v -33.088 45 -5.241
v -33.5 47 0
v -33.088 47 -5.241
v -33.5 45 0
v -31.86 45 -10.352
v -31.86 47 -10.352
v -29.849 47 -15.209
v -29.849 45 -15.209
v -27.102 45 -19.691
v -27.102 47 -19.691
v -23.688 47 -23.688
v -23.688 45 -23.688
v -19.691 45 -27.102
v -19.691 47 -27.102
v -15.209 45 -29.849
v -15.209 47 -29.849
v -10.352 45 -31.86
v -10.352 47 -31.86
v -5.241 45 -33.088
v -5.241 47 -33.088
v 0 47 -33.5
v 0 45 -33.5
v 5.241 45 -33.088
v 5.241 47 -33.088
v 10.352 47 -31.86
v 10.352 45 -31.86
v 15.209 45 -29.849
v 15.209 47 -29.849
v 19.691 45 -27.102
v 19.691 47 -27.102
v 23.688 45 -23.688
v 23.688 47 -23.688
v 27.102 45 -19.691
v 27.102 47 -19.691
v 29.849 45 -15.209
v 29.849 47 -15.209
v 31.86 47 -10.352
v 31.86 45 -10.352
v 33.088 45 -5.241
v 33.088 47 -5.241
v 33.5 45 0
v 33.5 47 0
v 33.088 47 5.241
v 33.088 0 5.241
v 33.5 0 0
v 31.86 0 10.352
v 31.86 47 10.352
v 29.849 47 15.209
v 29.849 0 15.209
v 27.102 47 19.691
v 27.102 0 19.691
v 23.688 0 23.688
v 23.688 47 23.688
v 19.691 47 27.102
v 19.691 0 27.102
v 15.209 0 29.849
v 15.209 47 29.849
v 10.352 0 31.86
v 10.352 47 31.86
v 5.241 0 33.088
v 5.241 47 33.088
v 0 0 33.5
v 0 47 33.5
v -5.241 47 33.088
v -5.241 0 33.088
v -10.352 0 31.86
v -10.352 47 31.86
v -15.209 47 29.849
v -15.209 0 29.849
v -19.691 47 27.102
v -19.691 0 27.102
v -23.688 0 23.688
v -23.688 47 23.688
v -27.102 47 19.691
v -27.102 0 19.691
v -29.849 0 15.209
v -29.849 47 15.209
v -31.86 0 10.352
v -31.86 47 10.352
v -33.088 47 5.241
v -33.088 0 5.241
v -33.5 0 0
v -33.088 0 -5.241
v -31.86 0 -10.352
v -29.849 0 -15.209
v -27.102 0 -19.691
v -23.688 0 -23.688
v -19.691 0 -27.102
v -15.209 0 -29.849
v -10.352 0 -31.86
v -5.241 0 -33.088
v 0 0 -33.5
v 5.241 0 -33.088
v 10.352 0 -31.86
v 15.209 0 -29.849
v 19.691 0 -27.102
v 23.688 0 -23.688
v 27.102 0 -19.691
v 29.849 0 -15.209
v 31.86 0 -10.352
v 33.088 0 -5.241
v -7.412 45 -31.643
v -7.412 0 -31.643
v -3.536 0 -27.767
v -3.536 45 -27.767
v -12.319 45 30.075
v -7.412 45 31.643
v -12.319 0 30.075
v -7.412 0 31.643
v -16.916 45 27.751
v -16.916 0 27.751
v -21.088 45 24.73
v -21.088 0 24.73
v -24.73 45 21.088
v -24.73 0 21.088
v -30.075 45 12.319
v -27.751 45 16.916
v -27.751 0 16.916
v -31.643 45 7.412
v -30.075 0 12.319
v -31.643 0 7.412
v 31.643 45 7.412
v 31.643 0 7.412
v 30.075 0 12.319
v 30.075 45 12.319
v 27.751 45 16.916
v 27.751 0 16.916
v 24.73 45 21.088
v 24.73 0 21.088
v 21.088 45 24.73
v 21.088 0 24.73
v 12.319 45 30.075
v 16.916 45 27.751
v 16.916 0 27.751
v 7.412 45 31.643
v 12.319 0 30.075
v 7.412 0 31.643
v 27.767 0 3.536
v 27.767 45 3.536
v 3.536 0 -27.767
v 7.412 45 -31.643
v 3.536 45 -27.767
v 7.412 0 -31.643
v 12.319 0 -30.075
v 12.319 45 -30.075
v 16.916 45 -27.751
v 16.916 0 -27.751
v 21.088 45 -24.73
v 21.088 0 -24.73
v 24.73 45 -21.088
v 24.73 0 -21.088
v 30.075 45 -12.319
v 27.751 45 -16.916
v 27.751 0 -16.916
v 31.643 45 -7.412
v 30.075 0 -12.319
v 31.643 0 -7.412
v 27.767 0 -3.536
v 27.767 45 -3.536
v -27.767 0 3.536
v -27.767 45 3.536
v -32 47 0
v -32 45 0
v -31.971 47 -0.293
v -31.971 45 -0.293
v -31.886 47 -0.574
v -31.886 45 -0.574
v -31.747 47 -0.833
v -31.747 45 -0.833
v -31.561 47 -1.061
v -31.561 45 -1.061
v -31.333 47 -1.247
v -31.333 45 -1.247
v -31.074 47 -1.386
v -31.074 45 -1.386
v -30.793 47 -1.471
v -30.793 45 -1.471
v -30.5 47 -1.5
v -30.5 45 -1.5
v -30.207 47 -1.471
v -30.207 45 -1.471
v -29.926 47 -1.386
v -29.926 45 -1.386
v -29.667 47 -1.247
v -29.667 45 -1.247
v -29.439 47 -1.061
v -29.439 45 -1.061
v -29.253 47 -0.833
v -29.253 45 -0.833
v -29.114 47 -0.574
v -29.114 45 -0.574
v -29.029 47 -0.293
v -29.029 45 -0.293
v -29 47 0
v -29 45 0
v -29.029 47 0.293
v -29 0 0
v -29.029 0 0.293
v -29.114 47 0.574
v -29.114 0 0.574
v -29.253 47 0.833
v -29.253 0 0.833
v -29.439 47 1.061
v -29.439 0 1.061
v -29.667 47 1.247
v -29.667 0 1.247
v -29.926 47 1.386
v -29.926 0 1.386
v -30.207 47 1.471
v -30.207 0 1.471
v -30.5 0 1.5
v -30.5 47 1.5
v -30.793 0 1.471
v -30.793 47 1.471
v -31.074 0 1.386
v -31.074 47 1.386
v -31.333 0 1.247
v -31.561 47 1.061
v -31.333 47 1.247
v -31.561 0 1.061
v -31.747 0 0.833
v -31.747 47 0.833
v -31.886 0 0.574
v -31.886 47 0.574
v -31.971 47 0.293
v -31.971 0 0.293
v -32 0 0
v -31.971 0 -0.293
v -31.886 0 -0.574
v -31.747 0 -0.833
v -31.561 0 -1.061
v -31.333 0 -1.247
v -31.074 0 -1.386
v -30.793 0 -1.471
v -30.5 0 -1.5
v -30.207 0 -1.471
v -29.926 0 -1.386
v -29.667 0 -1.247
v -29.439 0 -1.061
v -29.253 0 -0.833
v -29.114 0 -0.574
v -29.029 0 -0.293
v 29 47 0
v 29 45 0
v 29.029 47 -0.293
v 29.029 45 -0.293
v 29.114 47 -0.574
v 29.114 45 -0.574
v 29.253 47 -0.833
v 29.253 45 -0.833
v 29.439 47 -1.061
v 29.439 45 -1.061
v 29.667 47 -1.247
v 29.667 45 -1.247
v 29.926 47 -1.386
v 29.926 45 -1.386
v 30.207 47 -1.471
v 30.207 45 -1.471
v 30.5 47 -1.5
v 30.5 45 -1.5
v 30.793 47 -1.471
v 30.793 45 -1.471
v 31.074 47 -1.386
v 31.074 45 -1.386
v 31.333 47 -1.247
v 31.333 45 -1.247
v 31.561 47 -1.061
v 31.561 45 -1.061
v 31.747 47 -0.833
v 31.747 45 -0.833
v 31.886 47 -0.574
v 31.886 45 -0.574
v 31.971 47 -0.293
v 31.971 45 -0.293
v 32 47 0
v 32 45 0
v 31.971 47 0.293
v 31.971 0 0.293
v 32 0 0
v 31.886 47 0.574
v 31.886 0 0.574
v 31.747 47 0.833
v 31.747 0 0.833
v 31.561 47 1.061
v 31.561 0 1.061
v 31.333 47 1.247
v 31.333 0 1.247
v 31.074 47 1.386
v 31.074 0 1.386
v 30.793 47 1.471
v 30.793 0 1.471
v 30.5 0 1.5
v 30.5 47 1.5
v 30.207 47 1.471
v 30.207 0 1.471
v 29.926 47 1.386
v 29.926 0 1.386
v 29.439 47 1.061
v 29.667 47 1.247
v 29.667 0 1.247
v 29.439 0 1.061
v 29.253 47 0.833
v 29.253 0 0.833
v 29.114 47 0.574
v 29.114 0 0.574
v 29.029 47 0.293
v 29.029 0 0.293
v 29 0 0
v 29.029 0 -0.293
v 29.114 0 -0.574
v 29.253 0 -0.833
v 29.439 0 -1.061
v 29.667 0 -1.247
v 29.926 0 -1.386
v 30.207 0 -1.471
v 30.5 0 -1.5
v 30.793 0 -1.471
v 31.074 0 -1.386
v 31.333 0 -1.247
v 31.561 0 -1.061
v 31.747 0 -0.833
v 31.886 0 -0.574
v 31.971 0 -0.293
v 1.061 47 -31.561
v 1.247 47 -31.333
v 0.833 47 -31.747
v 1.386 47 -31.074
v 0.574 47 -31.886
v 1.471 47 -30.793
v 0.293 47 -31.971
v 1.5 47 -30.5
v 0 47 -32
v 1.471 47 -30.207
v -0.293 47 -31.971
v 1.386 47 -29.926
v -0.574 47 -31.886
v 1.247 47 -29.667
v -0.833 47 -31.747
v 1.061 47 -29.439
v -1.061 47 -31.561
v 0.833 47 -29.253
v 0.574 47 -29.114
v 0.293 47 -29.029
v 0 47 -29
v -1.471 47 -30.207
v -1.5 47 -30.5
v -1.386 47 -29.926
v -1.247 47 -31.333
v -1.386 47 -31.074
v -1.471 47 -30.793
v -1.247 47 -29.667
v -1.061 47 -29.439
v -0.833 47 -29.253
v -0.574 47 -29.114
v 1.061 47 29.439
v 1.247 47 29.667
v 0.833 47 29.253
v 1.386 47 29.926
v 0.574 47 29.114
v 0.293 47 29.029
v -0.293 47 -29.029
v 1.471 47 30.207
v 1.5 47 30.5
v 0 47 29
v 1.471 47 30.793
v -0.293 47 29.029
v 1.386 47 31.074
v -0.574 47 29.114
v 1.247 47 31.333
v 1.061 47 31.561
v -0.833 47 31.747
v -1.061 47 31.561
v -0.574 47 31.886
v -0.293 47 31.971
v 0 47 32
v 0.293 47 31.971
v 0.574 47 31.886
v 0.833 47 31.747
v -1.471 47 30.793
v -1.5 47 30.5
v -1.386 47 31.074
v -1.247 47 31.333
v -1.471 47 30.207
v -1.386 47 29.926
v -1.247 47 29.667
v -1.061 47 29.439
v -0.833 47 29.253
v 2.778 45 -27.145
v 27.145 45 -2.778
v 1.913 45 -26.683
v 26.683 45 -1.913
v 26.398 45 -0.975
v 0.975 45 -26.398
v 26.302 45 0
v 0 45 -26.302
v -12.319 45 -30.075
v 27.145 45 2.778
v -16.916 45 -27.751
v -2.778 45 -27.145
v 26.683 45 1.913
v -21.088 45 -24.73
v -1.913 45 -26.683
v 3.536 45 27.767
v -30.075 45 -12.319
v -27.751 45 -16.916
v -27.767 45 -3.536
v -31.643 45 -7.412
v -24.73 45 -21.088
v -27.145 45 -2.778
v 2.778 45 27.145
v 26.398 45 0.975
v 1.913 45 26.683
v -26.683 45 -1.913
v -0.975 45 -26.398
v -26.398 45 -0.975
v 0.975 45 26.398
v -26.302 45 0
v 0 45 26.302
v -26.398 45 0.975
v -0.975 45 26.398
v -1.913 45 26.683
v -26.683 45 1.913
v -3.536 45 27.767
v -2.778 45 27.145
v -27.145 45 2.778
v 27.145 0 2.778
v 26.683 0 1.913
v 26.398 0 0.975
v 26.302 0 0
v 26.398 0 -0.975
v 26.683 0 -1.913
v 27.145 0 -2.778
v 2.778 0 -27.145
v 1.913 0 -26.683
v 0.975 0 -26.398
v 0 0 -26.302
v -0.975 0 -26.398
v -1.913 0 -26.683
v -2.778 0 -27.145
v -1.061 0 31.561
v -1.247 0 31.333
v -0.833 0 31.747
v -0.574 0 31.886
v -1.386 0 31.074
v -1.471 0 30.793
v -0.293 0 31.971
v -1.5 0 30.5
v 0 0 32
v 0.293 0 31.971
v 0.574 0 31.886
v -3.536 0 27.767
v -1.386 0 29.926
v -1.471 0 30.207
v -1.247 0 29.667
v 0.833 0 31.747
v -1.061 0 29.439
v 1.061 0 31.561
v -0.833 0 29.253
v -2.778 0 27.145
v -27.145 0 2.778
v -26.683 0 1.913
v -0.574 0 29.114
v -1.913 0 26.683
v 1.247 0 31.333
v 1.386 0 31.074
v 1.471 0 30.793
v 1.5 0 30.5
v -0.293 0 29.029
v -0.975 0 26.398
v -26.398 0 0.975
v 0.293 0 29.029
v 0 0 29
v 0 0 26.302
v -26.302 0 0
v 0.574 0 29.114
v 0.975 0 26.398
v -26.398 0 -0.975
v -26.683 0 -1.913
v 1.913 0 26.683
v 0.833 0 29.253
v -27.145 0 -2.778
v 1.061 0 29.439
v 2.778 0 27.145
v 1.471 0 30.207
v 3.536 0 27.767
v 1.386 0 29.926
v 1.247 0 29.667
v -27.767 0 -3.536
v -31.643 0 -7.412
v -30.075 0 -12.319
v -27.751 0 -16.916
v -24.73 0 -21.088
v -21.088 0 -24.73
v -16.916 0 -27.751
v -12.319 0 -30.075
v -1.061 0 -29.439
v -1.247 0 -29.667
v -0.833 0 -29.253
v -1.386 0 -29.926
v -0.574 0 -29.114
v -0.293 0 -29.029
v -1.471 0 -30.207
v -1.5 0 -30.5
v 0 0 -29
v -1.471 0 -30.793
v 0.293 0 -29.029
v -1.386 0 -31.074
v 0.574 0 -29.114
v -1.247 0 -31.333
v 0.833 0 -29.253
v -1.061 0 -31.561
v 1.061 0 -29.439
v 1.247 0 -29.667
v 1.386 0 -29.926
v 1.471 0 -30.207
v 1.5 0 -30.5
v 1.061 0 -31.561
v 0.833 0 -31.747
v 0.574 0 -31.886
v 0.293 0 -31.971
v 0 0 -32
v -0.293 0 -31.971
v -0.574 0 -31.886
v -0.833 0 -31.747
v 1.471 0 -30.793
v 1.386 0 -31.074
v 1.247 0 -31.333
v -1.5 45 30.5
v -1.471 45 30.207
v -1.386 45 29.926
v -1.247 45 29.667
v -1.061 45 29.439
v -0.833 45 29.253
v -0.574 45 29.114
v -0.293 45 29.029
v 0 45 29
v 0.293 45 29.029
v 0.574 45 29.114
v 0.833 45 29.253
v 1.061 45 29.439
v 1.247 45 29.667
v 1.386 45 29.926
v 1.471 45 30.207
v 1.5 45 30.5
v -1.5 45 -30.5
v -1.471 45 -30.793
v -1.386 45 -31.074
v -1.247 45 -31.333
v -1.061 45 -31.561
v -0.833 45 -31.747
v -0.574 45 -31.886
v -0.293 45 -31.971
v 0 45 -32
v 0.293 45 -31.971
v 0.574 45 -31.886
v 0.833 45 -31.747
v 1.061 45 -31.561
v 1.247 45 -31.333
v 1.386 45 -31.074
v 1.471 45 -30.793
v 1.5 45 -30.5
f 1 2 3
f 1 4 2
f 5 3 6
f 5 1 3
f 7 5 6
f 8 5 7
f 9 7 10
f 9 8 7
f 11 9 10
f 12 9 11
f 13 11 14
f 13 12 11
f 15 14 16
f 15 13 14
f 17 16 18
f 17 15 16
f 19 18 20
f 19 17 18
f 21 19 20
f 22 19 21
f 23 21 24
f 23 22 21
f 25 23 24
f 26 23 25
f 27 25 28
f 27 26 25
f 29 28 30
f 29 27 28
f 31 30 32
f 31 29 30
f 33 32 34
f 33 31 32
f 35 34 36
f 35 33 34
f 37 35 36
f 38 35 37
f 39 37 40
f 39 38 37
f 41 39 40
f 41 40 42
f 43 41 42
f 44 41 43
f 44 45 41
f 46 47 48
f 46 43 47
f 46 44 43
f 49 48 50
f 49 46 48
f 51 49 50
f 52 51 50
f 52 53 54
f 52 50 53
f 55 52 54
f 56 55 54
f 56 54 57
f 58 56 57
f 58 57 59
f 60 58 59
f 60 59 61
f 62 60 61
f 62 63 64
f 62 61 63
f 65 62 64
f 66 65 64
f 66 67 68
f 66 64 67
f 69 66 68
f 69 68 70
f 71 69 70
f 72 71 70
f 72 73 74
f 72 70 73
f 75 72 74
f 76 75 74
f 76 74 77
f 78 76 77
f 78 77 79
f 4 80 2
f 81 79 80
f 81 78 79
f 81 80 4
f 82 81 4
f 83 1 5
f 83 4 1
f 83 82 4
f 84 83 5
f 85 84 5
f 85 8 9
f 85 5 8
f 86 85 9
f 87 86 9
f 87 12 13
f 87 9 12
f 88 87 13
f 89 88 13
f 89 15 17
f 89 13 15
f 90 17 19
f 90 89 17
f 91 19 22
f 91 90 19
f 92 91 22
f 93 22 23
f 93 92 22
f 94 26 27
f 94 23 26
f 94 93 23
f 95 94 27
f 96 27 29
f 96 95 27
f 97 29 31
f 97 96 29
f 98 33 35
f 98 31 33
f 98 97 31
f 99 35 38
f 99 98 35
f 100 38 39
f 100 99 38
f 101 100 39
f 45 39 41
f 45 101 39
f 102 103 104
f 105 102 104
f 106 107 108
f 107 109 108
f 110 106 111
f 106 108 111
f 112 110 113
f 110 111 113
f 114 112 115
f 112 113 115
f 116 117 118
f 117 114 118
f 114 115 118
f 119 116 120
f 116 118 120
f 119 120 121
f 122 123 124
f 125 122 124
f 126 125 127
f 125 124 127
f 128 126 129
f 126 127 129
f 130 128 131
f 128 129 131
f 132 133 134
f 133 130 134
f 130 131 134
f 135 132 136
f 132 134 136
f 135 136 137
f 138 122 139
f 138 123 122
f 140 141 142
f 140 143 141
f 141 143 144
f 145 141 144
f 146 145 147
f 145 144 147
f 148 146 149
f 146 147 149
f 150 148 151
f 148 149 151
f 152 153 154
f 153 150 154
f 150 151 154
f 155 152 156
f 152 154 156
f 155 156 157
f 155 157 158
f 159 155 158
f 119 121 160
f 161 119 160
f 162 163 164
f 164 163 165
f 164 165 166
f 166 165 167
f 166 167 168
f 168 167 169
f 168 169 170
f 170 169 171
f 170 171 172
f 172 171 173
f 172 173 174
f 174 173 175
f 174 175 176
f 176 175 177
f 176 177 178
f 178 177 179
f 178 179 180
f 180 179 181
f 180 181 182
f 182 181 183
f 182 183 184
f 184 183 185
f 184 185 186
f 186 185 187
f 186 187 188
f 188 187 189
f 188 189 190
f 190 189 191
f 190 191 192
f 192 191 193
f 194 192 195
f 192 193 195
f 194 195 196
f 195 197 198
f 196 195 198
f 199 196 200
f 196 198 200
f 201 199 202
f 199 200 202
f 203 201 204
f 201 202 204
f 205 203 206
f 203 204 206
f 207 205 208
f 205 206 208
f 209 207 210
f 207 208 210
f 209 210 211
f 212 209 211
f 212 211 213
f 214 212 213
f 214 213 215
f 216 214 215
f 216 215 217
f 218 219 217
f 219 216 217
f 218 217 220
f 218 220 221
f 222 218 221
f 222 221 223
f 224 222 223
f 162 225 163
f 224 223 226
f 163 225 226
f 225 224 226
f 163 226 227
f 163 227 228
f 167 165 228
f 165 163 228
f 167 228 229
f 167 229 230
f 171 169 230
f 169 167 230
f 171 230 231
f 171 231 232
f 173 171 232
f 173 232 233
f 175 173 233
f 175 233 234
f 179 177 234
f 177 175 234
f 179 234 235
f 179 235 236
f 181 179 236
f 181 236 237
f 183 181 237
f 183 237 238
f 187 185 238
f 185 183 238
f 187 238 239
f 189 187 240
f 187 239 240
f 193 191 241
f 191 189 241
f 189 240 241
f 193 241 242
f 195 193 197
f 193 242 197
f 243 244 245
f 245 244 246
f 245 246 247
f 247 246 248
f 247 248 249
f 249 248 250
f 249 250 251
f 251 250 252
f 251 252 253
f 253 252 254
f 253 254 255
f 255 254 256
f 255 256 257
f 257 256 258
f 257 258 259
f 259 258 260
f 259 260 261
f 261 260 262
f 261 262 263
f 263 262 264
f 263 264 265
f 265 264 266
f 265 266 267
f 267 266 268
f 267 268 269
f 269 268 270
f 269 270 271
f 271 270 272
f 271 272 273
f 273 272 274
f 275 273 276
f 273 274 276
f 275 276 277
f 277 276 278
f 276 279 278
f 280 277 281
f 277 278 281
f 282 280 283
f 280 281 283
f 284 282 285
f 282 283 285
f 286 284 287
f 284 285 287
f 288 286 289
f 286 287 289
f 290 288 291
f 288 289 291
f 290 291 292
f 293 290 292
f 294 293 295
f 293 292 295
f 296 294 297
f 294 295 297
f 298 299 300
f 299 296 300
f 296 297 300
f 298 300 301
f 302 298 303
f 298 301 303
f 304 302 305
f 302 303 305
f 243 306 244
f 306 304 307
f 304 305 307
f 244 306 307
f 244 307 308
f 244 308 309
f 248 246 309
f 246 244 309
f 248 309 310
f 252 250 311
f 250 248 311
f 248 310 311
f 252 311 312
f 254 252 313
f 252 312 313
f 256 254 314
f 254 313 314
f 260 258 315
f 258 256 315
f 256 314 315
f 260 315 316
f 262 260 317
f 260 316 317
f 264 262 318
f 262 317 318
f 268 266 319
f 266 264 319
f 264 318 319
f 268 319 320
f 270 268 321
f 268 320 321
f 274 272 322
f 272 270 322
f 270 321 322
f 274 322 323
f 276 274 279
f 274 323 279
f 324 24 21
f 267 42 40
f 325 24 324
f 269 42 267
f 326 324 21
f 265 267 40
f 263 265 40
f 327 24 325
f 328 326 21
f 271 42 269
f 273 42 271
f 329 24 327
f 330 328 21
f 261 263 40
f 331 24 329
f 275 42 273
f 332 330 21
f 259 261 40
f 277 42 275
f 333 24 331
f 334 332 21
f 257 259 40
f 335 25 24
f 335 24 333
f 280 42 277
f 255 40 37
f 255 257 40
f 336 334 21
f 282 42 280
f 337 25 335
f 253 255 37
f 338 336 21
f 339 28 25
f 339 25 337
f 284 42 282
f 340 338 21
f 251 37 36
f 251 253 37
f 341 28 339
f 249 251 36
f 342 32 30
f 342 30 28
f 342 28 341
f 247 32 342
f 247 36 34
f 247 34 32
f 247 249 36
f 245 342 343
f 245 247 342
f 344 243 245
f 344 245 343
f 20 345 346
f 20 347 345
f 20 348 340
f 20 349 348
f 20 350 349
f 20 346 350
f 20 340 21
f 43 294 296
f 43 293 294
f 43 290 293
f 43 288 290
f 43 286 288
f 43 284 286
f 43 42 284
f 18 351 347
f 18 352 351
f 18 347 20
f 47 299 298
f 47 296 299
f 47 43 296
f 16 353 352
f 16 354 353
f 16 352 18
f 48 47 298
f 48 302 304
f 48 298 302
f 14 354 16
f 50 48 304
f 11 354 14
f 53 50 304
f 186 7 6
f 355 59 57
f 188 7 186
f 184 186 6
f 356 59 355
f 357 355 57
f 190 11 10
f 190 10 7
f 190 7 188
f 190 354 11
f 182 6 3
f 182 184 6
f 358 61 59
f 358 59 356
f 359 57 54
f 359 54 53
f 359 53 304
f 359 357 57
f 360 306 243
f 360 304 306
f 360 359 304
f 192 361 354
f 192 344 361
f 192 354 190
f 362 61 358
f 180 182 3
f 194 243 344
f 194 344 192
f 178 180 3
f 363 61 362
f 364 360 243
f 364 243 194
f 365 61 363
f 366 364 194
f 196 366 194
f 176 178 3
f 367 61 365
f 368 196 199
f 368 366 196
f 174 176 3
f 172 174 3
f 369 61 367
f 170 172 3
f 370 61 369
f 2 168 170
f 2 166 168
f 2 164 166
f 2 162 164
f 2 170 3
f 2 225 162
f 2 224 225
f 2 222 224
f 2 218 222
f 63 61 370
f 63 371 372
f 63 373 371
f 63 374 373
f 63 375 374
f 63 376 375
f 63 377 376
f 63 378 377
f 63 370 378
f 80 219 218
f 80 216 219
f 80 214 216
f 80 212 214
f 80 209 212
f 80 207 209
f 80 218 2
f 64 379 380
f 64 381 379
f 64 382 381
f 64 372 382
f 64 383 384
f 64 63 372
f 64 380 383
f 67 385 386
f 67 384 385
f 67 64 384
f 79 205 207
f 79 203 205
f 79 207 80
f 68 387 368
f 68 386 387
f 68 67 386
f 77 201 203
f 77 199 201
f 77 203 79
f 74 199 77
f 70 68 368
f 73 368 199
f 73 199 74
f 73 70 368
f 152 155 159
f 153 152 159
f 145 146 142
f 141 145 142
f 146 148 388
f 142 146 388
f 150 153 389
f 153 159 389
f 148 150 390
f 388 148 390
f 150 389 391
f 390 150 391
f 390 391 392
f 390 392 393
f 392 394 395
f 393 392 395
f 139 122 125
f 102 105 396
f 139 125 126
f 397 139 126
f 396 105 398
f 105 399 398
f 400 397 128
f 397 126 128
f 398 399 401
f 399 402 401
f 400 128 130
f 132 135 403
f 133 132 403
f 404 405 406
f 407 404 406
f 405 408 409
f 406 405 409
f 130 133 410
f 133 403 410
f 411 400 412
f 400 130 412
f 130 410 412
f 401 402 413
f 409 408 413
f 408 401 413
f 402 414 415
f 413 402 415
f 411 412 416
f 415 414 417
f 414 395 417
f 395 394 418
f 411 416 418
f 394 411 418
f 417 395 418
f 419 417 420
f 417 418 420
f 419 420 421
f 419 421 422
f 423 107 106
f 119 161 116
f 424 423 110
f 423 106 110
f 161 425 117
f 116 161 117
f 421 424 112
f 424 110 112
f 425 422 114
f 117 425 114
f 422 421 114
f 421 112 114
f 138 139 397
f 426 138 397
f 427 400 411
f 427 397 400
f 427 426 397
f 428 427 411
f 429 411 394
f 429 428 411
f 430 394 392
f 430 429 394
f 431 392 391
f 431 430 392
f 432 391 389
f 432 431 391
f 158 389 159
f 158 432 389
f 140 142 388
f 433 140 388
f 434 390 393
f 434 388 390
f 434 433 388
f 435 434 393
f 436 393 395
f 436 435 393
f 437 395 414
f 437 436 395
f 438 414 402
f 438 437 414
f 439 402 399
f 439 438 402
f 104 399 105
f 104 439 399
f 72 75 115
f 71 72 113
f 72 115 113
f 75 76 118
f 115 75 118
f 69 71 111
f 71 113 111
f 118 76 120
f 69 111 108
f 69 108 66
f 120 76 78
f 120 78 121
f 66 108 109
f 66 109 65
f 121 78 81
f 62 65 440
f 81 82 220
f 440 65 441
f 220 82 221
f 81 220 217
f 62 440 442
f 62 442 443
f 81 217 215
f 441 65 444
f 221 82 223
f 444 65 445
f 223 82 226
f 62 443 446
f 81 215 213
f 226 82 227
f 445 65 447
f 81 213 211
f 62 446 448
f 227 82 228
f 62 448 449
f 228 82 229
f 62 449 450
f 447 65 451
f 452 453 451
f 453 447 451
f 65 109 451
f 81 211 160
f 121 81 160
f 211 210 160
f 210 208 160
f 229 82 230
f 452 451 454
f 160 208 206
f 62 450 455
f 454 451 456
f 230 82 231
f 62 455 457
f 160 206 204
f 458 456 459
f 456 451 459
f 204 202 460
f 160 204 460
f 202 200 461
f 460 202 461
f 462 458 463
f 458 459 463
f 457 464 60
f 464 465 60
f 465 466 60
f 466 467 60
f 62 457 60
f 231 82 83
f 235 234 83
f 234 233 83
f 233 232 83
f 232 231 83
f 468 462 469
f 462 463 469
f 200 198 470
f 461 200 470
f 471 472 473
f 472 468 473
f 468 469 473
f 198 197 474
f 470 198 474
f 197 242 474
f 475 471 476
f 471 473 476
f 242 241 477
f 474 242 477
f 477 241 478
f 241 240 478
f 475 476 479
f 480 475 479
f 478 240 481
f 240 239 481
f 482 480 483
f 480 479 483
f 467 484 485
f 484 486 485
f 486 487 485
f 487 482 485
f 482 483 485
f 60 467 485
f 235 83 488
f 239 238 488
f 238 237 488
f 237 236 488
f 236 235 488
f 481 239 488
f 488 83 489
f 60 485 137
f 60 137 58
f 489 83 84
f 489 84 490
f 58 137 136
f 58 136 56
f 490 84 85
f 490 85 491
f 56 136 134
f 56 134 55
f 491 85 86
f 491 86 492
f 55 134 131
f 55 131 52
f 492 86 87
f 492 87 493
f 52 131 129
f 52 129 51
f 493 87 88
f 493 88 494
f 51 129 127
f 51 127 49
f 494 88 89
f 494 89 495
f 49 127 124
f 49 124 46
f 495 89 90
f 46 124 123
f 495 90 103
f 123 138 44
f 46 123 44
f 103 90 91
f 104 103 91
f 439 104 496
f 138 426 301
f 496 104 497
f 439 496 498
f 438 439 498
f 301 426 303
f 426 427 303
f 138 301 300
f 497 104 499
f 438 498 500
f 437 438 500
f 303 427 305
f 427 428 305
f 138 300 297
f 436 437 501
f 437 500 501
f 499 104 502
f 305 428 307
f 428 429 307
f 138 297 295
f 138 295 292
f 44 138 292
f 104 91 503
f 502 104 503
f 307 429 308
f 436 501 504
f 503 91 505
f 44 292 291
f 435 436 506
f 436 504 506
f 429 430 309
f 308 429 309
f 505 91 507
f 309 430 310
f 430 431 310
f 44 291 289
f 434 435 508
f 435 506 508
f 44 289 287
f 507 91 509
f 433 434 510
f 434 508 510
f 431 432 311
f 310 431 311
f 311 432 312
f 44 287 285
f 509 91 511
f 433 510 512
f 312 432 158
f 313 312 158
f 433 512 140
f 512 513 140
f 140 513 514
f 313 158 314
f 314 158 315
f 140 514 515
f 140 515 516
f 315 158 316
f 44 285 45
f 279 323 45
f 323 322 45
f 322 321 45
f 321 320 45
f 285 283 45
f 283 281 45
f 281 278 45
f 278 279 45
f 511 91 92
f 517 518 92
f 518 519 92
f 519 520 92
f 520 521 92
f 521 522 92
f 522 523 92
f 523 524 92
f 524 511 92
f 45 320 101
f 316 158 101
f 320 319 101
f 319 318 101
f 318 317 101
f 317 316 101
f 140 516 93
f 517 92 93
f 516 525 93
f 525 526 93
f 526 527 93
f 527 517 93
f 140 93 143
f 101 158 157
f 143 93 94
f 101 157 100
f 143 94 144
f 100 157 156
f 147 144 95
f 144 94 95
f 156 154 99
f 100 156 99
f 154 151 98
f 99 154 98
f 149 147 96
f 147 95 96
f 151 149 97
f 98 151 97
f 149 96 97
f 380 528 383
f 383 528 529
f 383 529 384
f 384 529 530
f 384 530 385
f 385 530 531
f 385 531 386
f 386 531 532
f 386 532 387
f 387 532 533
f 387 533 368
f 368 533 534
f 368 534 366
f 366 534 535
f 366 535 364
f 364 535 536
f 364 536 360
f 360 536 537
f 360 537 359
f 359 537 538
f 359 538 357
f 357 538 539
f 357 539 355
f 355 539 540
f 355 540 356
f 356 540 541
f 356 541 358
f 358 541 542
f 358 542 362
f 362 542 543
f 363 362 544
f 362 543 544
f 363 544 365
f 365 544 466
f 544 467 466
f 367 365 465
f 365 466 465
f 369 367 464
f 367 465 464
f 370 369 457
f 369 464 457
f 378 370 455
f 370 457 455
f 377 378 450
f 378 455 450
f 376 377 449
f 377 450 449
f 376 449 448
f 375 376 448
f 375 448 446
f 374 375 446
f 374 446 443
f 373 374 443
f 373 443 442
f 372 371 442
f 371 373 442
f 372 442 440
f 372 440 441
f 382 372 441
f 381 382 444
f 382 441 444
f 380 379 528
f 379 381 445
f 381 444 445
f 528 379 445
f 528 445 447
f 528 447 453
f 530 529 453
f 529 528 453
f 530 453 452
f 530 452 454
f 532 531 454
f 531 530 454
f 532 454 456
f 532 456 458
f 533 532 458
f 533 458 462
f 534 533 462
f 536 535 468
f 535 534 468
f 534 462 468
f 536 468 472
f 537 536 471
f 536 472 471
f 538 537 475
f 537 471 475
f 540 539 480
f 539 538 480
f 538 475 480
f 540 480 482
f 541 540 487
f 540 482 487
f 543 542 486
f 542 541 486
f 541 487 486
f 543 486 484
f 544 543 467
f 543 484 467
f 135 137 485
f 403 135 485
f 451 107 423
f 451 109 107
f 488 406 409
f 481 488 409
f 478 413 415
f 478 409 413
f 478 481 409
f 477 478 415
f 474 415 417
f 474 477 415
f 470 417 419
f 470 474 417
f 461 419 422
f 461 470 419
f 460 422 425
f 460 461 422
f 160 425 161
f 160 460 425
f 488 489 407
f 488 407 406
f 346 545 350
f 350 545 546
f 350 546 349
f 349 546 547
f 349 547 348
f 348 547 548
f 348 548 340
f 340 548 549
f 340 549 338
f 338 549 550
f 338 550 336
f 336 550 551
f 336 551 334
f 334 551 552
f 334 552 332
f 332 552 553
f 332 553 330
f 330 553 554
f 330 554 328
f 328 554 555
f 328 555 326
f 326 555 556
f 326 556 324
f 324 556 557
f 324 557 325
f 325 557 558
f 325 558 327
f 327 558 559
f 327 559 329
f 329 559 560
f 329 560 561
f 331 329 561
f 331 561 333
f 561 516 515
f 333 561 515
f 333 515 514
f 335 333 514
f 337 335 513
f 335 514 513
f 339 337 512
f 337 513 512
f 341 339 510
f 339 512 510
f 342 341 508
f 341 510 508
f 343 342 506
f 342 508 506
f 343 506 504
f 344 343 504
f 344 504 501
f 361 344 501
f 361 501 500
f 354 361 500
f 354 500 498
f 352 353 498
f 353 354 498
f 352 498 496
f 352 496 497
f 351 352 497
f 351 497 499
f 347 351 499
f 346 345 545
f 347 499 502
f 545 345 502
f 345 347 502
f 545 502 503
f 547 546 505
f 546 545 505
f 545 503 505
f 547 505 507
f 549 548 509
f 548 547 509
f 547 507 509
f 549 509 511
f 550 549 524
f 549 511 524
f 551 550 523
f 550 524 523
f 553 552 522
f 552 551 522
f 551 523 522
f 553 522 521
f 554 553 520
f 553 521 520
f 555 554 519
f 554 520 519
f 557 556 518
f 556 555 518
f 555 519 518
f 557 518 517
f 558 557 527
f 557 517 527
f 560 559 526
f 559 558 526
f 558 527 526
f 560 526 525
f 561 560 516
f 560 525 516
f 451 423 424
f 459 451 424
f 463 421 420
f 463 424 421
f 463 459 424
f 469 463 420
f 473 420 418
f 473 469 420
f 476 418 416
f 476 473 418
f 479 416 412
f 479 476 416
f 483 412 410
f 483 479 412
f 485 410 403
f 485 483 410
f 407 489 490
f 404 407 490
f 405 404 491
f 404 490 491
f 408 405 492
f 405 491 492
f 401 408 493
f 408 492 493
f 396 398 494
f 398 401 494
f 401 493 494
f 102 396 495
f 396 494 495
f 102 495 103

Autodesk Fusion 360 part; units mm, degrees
sketch "Sketch1" plane through (0, 0, 0) normal (0, 1, 0) x (1, 0, 0)
  circle A0 centre (0, 0) radius 30.5 construction
  circle A1 centre (0, -30.5) radius 1.5
  circle A2 centre (0, -30.5) radius 7.5 construction
  line L0 (-7.4123, -31.6434) -> (6.1101, -31.6434) construction
  line L1 (7.4123, -31.6434) -> (22.9663, -31.6434) construction
  line L2 (-7.4123, -31.6434) -> (-3.5355, -27.7667)
  line L3 (7.4123, -31.6434) -> (3.5355, -27.7667)
  arc A3 (3.5355, -27.7667) -> (-3.5355, -27.7667) centre (0, -31.3022) ccw
  circle A4 centre (0, 0) radius 33.5
  arc A5 (27.7667, 3.5355) -> (27.7667, -3.5355) centre (31.3022, 0) ccw
  line L4 (31.6434, -7.4123) -> (27.7667, -3.5355)
  line L5 (31.6434, 7.4123) -> (27.7667, 3.5355)
  circle A6 centre (30.5, 0) radius 1.5
  arc A7 (-3.5355, 27.7667) -> (3.5355, 27.7667) centre (0, 31.3022) ccw
  line L6 (7.4123, 31.6434) -> (3.5355, 27.7667)
  line L7 (-7.4123, 31.6434) -> (-3.5355, 27.7667)
  circle A8 centre (0, 30.5) radius 1.5
  arc A9 (-27.7667, -3.5355) -> (-27.7667, 3.5355) centre (-31.3022, 0) ccw
  line L8 (-31.6434, 7.4123) -> (-27.7667, 3.5355)
  line L9 (-31.6434, -7.4123) -> (-27.7667, -3.5355)
  circle A10 centre (-30.5, 0) radius 1.5
  arc A11 (7.4123, -31.6434) -> (31.6434, -7.4123) centre (0, 0) ccw
  arc A12 (31.6434, 7.4123) -> (7.4123, 31.6434) centre (0, 0) ccw
  arc A13 (-7.4123, 31.6434) -> (-31.6434, 7.4123) centre (0, 0) ccw
  arc A14 (-31.6434, -7.4123) -> (-7.4123, -31.6434) centre (0, 0) ccw
  dimension "d1" = 65
  dimension "d2" = 61
  dimension "d4" = 3
  dimension "d9" = 15
  dimension "d11" = 45
  dimension "d12" = 135
  dimension "d13" = 5
  dimension "d16" = 360
extrude "Extrude1" add sketch "Sketch1" along normal blind 45
sketch "Sketch2" plane through (0, 45, 0) normal (0, 1, 0) x (-1, 0, 0)
  circle A0 centre (-30.5, 0) radius 1.5
  line L0 (31.6434, 7.4123) -> (27.7667, 3.5355)
  arc A1 (27.7667, 3.5355) -> (27.7667, -3.5355) centre (31.3022, 0) ccw
  line L1 (27.7667, -3.5355) -> (31.6434, -7.4123)
  arc A2 (7.4123, -31.6434) -> (31.6434, -7.4123) centre (0, 0) ccw
  line L2 (7.4123, -31.6434) -> (3.5355, -27.7667)
  arc A3 (3.5355, -27.7667) -> (-3.5355, -27.7667) centre (0, -31.3022) ccw
  line L3 (-3.5355, -27.7667) -> (-7.4123, -31.6434)
  arc A4 (-31.6434, -7.4123) -> (-7.4123, -31.6434) centre (0, 0) ccw
  line L4 (-31.6434, -7.4123) -> (-27.7667, -3.5355)
  arc A5 (-27.7667, -3.5355) -> (-27.7667, 3.5355) centre (-31.3022, 0) ccw
  line L5 (-27.7667, 3.5355) -> (-31.6434, 7.4123)
  arc A6 (-7.4123, 31.6434) -> (-31.6434, 7.4123) centre (0, 0) ccw
  line L6 (-7.4123, 31.6434) -> (-3.5355, 27.7667)
  arc A7 (-3.5355, 27.7667) -> (3.5355, 27.7667) centre (0, 31.3022) ccw
  line L7 (3.5355, 27.7667) -> (7.4123, 31.6434)
  arc A8 (31.6434, 7.4123) -> (7.4123, 31.6434) centre (0, 0) ccw
  circle A9 centre (0, 30.5) radius 1.5
  circle A10 centre (0, -30.5) radius 1.5
  circle A11 centre (30.5, 0) radius 1.5
  circle A12 centre (0, 0) radius 33.5
  circle A13 centre (0, 0) radius 33.5
extrude "Extrude2" add sketch "Sketch2" along normal blind 2 contours L0 A1 L1 A2 L2 A3 L3 A4 L4 A5 L5 A6 L6 A7 L7 A8 | A12 A13
